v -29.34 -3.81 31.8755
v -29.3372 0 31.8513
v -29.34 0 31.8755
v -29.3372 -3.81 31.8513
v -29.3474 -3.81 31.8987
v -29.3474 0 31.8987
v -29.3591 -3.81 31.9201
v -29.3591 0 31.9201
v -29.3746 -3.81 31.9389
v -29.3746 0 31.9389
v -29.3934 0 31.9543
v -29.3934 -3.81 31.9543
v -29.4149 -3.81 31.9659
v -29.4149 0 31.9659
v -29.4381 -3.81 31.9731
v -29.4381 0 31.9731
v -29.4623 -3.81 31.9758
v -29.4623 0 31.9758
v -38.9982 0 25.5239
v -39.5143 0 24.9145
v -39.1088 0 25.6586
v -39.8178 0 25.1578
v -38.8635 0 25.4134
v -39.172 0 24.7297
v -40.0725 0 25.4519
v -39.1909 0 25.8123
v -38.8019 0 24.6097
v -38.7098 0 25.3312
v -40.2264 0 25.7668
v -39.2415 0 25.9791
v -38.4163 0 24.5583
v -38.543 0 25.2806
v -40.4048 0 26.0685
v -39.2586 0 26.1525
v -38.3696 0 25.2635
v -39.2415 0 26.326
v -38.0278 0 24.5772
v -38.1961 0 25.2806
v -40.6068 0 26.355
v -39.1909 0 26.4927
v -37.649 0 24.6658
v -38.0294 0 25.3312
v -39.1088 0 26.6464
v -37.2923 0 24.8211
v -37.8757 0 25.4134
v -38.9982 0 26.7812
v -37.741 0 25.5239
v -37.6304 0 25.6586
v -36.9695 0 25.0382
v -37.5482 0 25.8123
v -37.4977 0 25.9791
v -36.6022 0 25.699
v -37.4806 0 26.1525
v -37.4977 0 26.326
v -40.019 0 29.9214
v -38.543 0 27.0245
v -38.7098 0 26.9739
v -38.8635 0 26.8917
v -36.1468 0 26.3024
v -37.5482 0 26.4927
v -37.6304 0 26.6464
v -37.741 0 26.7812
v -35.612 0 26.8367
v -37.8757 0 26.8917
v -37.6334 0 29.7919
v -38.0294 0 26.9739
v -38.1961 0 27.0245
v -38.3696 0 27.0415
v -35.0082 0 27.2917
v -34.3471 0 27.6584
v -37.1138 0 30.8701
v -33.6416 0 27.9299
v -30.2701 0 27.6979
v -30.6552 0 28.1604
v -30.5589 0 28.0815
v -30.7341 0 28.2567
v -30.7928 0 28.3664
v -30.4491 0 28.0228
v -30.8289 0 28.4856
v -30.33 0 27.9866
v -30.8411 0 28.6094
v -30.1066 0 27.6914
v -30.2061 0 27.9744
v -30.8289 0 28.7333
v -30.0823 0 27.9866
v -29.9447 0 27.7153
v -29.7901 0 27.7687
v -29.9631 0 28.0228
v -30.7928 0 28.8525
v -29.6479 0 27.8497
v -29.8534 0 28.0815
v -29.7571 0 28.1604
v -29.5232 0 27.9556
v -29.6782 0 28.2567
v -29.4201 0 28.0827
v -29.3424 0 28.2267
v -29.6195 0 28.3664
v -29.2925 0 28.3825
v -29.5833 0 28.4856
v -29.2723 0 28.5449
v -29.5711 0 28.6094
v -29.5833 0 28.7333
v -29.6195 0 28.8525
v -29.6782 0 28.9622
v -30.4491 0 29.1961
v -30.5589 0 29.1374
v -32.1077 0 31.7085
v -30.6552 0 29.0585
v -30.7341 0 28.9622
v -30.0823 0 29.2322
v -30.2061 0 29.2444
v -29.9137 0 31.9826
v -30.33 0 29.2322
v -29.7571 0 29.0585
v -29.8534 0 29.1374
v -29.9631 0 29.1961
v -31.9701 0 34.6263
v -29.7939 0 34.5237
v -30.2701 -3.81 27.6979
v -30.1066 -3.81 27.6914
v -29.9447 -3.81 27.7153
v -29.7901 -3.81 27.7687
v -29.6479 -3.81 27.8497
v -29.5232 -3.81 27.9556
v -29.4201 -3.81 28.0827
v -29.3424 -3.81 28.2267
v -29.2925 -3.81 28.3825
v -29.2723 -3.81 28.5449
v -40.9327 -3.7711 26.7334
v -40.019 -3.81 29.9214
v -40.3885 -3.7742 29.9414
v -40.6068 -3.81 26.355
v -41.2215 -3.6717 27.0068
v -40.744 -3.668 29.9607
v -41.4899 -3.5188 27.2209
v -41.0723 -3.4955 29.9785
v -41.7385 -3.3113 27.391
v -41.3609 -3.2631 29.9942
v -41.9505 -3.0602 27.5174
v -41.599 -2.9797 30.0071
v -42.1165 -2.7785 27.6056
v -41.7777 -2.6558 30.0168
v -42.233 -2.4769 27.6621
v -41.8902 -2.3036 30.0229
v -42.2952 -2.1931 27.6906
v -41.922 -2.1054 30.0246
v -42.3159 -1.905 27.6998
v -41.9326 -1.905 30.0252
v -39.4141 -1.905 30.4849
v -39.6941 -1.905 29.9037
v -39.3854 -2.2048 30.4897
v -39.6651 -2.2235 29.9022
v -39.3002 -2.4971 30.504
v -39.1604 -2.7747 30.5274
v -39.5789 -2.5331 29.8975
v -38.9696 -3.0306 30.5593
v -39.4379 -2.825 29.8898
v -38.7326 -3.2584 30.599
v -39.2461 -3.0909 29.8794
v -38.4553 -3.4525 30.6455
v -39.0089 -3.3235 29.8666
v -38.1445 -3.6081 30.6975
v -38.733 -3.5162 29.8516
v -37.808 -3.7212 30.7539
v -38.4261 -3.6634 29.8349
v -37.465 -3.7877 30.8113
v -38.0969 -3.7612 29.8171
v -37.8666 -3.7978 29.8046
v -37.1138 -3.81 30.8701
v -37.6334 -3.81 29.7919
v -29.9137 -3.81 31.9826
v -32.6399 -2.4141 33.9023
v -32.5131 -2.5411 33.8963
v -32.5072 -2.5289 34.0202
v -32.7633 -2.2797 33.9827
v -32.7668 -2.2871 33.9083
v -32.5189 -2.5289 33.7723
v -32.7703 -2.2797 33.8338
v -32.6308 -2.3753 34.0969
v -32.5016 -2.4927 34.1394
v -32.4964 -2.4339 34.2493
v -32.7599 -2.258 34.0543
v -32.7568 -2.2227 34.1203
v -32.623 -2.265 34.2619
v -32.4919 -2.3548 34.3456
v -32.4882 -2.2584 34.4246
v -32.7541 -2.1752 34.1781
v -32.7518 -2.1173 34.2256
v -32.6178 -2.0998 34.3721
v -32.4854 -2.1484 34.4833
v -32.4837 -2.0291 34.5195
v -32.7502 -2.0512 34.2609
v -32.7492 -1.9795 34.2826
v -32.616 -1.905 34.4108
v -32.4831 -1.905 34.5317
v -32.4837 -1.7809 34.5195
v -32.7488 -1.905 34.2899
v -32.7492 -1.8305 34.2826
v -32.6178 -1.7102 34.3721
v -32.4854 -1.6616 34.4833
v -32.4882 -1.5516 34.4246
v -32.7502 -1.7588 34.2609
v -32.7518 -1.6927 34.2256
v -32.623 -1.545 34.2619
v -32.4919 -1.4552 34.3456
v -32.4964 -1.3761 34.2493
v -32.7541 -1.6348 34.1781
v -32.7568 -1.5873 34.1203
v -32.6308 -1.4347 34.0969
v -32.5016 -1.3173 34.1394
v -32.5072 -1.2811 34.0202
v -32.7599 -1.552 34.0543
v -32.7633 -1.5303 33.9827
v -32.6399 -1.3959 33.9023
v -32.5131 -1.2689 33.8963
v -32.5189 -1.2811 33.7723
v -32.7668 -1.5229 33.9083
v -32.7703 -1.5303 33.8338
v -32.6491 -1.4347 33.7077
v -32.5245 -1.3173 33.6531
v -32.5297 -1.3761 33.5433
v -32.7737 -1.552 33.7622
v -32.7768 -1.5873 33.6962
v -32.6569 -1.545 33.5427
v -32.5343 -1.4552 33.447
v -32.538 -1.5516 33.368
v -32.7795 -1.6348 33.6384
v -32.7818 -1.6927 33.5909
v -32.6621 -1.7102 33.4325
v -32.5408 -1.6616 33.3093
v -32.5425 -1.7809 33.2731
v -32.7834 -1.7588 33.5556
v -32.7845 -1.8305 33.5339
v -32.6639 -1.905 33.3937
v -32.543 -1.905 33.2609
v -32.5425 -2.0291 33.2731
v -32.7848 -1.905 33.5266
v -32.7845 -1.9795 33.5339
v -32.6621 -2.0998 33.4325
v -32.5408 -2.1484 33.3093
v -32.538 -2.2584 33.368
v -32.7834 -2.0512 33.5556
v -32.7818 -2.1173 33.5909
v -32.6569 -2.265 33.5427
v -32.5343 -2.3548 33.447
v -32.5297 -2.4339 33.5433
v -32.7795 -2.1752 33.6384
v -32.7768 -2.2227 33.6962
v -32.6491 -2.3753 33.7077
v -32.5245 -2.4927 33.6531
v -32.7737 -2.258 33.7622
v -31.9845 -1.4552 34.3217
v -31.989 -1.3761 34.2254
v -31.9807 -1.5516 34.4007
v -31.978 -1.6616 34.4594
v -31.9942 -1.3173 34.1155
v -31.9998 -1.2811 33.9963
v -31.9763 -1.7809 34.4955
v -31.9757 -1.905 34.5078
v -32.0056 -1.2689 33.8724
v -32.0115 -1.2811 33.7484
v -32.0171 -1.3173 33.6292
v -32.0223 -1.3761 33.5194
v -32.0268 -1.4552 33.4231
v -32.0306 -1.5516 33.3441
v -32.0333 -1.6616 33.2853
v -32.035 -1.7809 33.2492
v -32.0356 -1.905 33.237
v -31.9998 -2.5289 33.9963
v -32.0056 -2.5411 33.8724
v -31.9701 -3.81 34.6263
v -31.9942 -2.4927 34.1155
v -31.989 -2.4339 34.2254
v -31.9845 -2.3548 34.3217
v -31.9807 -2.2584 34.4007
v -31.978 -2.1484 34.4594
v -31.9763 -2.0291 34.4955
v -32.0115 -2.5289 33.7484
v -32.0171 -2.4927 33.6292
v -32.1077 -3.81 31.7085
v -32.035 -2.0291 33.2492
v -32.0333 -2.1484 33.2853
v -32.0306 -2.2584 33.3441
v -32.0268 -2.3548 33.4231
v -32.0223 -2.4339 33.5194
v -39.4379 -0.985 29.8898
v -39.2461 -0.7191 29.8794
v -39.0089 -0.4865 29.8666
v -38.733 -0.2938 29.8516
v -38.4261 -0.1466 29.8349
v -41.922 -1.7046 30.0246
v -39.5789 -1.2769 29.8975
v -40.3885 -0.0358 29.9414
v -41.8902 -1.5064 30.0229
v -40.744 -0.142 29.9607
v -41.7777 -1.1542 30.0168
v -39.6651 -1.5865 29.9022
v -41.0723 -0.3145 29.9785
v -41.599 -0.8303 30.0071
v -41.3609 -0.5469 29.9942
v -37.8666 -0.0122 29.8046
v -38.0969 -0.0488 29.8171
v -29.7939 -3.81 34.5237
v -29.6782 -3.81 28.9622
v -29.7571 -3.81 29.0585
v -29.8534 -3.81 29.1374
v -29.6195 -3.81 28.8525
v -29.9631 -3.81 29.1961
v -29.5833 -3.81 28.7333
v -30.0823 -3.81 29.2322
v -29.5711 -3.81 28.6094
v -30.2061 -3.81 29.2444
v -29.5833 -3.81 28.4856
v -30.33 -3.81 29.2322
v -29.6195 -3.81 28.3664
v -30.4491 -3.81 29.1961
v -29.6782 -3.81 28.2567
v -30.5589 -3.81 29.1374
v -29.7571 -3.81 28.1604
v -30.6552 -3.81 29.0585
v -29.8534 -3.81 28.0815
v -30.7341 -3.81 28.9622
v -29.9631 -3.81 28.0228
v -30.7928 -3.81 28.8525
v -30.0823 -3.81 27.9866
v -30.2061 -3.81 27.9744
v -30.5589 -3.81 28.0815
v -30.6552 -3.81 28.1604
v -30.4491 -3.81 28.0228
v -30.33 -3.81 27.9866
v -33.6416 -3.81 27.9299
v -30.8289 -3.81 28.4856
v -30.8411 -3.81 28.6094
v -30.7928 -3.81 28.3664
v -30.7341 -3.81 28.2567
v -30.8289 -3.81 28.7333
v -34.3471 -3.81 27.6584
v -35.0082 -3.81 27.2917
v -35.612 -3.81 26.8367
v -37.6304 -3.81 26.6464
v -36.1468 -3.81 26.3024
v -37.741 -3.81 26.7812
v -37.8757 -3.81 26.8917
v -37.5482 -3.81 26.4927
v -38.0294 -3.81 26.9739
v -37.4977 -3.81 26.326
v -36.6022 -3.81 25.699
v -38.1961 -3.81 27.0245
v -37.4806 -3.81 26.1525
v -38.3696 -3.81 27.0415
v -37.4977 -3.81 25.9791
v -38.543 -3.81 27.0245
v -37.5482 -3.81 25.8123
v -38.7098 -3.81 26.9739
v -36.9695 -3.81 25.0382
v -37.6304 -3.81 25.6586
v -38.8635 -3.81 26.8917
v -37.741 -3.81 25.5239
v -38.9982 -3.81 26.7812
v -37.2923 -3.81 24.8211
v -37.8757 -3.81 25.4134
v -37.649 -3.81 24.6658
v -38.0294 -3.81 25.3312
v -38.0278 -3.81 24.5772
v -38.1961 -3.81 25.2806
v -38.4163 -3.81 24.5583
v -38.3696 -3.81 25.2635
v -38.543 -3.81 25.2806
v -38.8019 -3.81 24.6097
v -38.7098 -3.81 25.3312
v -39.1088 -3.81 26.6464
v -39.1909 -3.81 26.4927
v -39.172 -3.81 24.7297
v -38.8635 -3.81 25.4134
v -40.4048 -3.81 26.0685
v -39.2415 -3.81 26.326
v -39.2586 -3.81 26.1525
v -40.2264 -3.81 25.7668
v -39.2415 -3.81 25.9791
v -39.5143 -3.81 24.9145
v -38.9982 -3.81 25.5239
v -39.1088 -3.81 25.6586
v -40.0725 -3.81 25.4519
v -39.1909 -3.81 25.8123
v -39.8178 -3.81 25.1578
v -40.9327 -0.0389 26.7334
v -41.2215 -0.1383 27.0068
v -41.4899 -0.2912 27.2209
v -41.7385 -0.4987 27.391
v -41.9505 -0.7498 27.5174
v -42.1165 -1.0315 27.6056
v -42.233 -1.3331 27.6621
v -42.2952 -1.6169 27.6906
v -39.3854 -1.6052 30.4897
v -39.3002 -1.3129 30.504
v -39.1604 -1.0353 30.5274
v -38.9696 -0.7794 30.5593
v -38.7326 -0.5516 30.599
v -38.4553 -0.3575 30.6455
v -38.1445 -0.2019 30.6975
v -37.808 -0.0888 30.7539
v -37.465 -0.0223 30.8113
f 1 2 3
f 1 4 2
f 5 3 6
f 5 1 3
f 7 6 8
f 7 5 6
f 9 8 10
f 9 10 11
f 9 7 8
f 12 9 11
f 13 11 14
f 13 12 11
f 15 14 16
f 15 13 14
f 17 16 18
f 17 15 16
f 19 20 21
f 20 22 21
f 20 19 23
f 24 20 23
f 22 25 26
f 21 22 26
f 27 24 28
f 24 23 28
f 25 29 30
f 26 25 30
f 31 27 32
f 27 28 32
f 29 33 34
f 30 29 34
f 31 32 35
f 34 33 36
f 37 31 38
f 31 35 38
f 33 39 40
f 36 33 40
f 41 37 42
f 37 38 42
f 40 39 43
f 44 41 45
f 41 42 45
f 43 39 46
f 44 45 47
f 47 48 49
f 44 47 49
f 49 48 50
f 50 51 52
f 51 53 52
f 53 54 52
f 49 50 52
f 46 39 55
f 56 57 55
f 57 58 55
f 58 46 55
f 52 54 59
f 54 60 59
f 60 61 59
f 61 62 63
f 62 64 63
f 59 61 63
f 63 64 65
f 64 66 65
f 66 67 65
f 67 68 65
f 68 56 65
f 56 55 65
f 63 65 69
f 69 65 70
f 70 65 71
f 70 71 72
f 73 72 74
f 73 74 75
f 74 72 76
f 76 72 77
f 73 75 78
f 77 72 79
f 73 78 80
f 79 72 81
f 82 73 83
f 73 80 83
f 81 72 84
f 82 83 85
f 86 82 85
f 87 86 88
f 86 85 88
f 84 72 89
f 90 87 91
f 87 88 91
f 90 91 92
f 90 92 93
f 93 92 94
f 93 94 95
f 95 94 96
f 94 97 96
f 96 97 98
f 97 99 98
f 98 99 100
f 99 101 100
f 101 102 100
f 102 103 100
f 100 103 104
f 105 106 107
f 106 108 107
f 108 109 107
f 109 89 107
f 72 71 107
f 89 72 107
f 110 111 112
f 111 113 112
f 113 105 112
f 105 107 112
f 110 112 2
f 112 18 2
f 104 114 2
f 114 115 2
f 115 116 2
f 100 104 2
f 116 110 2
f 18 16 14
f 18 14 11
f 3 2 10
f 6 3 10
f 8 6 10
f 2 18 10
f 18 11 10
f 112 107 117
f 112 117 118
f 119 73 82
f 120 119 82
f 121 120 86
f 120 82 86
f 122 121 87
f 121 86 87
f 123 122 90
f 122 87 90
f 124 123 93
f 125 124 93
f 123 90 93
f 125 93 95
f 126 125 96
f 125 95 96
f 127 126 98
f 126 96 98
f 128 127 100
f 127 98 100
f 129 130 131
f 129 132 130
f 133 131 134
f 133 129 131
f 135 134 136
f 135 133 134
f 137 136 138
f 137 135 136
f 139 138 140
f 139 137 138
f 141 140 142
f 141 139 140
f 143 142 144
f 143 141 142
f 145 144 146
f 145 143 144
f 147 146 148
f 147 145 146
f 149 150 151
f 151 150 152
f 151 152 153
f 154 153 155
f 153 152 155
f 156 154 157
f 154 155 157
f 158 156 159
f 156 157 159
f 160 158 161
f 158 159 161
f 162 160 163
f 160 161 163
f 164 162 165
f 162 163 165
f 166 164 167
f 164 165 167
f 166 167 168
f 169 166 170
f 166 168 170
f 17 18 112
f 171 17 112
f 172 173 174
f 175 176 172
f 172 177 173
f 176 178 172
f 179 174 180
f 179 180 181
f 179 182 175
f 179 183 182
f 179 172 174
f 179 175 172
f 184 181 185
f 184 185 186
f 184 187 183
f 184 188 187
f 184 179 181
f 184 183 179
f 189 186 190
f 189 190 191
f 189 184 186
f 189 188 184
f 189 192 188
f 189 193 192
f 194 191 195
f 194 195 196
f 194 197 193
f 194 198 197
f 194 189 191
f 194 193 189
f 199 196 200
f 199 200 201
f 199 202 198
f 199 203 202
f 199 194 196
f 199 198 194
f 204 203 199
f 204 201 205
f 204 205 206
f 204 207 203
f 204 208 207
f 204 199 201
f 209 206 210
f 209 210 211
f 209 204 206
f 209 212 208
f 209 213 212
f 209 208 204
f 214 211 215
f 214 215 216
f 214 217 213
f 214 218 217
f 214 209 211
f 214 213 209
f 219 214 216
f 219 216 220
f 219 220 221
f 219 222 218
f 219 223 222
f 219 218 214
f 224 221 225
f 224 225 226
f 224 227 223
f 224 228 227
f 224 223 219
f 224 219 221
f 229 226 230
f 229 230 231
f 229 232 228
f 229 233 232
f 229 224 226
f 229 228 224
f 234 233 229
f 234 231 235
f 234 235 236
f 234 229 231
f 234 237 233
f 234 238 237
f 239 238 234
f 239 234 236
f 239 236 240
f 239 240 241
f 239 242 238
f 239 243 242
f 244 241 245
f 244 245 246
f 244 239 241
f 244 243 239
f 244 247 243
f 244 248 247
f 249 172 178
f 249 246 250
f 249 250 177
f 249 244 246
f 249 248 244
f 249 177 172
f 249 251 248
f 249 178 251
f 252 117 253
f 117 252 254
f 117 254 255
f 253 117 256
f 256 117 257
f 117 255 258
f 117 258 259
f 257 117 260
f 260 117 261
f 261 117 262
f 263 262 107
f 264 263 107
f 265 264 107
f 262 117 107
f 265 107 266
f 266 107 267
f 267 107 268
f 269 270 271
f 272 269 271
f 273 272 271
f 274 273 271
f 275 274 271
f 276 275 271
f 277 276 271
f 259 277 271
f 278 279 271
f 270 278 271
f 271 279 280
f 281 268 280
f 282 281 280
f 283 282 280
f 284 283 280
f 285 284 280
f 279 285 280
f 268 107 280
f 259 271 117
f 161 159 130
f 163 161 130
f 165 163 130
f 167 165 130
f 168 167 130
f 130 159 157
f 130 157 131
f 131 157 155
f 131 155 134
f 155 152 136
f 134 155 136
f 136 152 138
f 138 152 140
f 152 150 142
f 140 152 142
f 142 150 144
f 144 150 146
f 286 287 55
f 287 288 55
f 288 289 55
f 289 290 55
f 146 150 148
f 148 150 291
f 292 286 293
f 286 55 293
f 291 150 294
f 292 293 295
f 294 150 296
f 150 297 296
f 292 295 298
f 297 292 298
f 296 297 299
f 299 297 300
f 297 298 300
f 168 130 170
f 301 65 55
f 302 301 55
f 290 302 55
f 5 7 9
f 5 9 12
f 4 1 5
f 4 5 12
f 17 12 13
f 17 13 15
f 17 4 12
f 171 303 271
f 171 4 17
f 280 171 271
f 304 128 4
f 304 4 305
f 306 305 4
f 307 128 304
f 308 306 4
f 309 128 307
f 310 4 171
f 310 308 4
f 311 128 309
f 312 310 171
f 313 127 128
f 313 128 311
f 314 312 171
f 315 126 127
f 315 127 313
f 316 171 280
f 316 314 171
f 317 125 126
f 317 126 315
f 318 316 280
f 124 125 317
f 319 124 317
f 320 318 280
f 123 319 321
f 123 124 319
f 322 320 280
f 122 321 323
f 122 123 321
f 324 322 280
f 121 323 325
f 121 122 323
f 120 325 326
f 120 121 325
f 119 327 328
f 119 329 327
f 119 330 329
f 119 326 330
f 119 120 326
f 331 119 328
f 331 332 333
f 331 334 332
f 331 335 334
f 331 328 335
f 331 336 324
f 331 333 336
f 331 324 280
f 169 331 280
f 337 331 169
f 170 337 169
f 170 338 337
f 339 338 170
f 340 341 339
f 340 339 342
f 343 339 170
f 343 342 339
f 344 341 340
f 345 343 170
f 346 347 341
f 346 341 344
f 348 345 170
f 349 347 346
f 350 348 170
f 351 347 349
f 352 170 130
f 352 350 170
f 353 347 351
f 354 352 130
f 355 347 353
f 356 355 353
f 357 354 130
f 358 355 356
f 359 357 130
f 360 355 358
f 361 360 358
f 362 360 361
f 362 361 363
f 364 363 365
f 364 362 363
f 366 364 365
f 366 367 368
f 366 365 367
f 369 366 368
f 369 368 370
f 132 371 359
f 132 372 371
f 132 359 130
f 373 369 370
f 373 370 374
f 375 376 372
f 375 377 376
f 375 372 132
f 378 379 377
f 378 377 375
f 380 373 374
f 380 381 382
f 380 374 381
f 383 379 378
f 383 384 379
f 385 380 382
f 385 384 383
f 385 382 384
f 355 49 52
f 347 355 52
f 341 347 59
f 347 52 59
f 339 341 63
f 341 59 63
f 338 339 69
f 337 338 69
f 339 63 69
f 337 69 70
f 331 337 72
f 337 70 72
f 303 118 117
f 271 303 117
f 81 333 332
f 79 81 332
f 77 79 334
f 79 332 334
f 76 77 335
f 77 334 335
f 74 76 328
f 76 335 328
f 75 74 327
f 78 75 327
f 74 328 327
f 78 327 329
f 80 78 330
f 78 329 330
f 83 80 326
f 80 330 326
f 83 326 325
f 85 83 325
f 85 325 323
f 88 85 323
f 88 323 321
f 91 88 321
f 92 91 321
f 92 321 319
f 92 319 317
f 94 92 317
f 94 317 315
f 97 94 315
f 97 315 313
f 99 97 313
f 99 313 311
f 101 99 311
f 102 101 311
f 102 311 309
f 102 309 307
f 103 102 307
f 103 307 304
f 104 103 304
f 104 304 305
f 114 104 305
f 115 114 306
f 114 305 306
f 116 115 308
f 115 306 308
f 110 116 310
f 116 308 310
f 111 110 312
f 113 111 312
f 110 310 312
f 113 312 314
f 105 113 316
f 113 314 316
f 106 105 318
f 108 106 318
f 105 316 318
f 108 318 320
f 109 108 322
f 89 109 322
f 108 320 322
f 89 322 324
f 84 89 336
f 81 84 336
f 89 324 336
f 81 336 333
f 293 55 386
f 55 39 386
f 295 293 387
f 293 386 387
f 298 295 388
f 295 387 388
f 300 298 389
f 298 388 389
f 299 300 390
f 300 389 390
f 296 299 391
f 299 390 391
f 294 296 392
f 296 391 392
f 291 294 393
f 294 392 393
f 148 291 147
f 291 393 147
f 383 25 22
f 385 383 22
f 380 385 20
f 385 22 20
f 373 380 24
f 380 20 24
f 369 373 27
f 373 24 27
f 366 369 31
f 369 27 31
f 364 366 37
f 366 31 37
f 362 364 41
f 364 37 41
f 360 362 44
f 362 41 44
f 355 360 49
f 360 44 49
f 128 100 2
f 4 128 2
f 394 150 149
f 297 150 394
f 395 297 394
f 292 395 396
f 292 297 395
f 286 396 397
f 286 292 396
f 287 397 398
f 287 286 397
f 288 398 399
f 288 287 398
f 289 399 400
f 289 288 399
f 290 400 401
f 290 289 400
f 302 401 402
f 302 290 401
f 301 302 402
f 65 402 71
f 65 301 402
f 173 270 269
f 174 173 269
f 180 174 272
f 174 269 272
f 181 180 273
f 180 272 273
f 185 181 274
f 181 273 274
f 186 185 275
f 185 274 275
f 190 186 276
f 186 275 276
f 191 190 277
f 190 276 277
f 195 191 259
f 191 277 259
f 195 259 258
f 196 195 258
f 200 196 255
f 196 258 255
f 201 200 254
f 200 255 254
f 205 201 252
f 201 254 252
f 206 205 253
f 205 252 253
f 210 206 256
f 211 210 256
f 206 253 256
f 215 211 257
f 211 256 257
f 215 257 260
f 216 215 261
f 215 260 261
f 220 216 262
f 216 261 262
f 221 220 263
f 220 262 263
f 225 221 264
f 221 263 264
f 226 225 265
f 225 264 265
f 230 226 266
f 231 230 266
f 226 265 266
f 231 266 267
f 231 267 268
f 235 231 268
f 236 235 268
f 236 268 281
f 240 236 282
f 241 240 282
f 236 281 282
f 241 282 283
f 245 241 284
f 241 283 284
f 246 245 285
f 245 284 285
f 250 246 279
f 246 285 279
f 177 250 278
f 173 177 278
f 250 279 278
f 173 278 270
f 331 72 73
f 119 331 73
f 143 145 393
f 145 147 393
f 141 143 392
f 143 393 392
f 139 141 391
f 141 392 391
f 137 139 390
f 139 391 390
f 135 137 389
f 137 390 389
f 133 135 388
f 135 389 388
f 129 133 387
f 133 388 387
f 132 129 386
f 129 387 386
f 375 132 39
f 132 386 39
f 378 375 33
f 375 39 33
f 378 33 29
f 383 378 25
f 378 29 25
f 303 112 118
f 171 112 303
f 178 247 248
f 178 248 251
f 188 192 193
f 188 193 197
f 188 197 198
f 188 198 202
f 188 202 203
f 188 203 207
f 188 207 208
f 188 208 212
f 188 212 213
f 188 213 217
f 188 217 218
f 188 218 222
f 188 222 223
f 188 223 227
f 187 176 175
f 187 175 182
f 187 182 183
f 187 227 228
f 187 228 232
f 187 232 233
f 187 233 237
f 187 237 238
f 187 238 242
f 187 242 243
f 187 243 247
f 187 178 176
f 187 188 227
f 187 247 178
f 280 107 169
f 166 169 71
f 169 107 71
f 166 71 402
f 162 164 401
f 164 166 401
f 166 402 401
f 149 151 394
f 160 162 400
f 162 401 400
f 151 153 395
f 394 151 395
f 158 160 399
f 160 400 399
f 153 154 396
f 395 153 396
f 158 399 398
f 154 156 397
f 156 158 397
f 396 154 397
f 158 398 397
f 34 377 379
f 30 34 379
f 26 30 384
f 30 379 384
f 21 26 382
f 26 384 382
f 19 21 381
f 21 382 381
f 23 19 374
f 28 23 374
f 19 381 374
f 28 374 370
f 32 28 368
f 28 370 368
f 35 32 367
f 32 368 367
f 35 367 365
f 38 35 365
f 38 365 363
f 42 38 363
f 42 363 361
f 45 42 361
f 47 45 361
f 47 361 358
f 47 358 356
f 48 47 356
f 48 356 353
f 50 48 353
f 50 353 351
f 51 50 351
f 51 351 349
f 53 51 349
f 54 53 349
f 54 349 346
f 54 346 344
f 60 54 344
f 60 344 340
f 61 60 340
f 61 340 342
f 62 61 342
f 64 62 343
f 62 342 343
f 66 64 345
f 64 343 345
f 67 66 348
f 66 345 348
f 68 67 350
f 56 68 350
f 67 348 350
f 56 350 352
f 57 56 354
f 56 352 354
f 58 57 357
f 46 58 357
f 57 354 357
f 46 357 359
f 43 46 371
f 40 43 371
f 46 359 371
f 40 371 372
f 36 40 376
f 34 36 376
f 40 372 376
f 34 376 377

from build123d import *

# Parameters (mm, degrees)
F1_DEPTH = 3.81
F2_D     = 1.778
F3_D     = 1.27
F4_R     = 1.90499
F5_DEPTH = 2.921
F6_R     = 0.636089801
F7_DEPTH = 0.762
F8_SIZE  = 0.254
F9_R     = 0.127


# Not quite as in the source:
# - a fillet or chamfer is up to 0.001 mm smaller than in the source, because OpenCascade refuses the exact size
# - a feature names something its author has since deleted; it is built from what else it names


with BuildPart() as f1:
    # F0 (on Front) → F1 (new body)
    with BuildSketch(Plane.XZ):
        with BuildLine():
            Line((-39.4140869416, 30.484917322), (-39.6941413215, 29.9037330352))
            Line((-39.6941413215, 29.9037330352), (-41.9326054958, 30.025163579))
            Line((-41.9326054958, 30.025163579), (-42.315851897, 27.6998355985))
            ThreePointArc((-42.315851897, 27.6998355985), (-40.9839410359, 26.7856748681), (-40.0724932551, 25.4519060254))
            ThreePointArc((-40.0724932551, 25.4519060254), (-38.6103077884, 24.5752589314), (-36.9695164263, 25.0381845981))
            ThreePointArc((-36.9695164263, 25.0381845981), (-35.6119860231, 26.8367061404), (-33.6415685093, 27.929877378))
            Line((-33.6415685093, 27.929877378), (-30.2701074994, 27.6978733483))
            ThreePointArc((-30.2701074994, 27.6978733483), (-29.5830798604, 27.8997588647), (-29.2723267028, 28.5448923498))
            Line((-29.2723267028, 28.5448923498), (-29.339633882, 31.9740138948))
            Line((-29.339633882, 31.9740138948), (-29.925275594, 31.9827347994))
            Line((-29.925275594, 31.9827347994), (-29.9314986914, 31.6059216857))
            Line((-29.9314986914, 31.6059216857), (-32.1076634707, 31.7085161805))
            Line((-32.1076634707, 31.7085161805), (-39.4140869416, 30.484917322))
        make_face()
    extrude(amount=F1_DEPTH)

    # F2 (through all)
    with Locations(Plane(origin=(0, 0, 0), x_dir=(1, 0, 0), z_dir=(0, 1, 0))):
        with Locations((-38.3695736527, -26.1525325477)):
            Hole(F2_D / 2)

    # F3 (through all)
    with Locations(Plane(origin=(0, 0, 0), x_dir=(1, 0, 0), z_dir=(0, 1, 0))):
        with Locations((-30.2061401308, -28.6094471812)):
            Hole(F3_D / 2)

    # F4 (radius 1.905 in the source; OpenCascade refuses exactly that, so slightly less here)
    f4_edges = [f1.edges().sort_by_distance(p)[0] for p in [
        (-42.124229, -3.81, 28.8625),
        (-42.124229, 0, 28.8625),
        (-39.554114, -3.81, 30.194325),
        (-39.554114, 0, 30.194325),
    ]]
    fillet(f4_edges, radius=F4_R)

    # F5 (add): a face of the model
    f5_faces = [f1.faces().sort_by_distance(p)[0] for p in [
        (-31.0195810811, -1.905, 31.6572189331),
    ]]
    extrude(f5_faces, amount=F5_DEPTH)

    # F6 (on face) → F7 (join)
    with BuildSketch(Plane(origin=(-33.5280299441, 0, 1.5806667432), x_dir=(0, -1, 0), z_dir=(-0.9988905408, 0, 0.0470923302))):
        with Locations((1.905, 32.3275662959)):
            Circle(F6_R)
    extrude(amount=F7_DEPTH)

    # F8
    f8_edges = [f1.edges().sort_by_distance(p)[0] for p in [
        (-32.766804, -1.26891, 33.908251),
    ]]
    chamfer(f8_edges, length=F8_SIZE)

    # F9
    f9_edges = [f1.edges().sort_by_distance(p)[0] for p in [
        (-29.339634, -1.905, 31.974014),
    ]]
    fillet(f9_edges, radius=F9_R)


solid = f1.part
